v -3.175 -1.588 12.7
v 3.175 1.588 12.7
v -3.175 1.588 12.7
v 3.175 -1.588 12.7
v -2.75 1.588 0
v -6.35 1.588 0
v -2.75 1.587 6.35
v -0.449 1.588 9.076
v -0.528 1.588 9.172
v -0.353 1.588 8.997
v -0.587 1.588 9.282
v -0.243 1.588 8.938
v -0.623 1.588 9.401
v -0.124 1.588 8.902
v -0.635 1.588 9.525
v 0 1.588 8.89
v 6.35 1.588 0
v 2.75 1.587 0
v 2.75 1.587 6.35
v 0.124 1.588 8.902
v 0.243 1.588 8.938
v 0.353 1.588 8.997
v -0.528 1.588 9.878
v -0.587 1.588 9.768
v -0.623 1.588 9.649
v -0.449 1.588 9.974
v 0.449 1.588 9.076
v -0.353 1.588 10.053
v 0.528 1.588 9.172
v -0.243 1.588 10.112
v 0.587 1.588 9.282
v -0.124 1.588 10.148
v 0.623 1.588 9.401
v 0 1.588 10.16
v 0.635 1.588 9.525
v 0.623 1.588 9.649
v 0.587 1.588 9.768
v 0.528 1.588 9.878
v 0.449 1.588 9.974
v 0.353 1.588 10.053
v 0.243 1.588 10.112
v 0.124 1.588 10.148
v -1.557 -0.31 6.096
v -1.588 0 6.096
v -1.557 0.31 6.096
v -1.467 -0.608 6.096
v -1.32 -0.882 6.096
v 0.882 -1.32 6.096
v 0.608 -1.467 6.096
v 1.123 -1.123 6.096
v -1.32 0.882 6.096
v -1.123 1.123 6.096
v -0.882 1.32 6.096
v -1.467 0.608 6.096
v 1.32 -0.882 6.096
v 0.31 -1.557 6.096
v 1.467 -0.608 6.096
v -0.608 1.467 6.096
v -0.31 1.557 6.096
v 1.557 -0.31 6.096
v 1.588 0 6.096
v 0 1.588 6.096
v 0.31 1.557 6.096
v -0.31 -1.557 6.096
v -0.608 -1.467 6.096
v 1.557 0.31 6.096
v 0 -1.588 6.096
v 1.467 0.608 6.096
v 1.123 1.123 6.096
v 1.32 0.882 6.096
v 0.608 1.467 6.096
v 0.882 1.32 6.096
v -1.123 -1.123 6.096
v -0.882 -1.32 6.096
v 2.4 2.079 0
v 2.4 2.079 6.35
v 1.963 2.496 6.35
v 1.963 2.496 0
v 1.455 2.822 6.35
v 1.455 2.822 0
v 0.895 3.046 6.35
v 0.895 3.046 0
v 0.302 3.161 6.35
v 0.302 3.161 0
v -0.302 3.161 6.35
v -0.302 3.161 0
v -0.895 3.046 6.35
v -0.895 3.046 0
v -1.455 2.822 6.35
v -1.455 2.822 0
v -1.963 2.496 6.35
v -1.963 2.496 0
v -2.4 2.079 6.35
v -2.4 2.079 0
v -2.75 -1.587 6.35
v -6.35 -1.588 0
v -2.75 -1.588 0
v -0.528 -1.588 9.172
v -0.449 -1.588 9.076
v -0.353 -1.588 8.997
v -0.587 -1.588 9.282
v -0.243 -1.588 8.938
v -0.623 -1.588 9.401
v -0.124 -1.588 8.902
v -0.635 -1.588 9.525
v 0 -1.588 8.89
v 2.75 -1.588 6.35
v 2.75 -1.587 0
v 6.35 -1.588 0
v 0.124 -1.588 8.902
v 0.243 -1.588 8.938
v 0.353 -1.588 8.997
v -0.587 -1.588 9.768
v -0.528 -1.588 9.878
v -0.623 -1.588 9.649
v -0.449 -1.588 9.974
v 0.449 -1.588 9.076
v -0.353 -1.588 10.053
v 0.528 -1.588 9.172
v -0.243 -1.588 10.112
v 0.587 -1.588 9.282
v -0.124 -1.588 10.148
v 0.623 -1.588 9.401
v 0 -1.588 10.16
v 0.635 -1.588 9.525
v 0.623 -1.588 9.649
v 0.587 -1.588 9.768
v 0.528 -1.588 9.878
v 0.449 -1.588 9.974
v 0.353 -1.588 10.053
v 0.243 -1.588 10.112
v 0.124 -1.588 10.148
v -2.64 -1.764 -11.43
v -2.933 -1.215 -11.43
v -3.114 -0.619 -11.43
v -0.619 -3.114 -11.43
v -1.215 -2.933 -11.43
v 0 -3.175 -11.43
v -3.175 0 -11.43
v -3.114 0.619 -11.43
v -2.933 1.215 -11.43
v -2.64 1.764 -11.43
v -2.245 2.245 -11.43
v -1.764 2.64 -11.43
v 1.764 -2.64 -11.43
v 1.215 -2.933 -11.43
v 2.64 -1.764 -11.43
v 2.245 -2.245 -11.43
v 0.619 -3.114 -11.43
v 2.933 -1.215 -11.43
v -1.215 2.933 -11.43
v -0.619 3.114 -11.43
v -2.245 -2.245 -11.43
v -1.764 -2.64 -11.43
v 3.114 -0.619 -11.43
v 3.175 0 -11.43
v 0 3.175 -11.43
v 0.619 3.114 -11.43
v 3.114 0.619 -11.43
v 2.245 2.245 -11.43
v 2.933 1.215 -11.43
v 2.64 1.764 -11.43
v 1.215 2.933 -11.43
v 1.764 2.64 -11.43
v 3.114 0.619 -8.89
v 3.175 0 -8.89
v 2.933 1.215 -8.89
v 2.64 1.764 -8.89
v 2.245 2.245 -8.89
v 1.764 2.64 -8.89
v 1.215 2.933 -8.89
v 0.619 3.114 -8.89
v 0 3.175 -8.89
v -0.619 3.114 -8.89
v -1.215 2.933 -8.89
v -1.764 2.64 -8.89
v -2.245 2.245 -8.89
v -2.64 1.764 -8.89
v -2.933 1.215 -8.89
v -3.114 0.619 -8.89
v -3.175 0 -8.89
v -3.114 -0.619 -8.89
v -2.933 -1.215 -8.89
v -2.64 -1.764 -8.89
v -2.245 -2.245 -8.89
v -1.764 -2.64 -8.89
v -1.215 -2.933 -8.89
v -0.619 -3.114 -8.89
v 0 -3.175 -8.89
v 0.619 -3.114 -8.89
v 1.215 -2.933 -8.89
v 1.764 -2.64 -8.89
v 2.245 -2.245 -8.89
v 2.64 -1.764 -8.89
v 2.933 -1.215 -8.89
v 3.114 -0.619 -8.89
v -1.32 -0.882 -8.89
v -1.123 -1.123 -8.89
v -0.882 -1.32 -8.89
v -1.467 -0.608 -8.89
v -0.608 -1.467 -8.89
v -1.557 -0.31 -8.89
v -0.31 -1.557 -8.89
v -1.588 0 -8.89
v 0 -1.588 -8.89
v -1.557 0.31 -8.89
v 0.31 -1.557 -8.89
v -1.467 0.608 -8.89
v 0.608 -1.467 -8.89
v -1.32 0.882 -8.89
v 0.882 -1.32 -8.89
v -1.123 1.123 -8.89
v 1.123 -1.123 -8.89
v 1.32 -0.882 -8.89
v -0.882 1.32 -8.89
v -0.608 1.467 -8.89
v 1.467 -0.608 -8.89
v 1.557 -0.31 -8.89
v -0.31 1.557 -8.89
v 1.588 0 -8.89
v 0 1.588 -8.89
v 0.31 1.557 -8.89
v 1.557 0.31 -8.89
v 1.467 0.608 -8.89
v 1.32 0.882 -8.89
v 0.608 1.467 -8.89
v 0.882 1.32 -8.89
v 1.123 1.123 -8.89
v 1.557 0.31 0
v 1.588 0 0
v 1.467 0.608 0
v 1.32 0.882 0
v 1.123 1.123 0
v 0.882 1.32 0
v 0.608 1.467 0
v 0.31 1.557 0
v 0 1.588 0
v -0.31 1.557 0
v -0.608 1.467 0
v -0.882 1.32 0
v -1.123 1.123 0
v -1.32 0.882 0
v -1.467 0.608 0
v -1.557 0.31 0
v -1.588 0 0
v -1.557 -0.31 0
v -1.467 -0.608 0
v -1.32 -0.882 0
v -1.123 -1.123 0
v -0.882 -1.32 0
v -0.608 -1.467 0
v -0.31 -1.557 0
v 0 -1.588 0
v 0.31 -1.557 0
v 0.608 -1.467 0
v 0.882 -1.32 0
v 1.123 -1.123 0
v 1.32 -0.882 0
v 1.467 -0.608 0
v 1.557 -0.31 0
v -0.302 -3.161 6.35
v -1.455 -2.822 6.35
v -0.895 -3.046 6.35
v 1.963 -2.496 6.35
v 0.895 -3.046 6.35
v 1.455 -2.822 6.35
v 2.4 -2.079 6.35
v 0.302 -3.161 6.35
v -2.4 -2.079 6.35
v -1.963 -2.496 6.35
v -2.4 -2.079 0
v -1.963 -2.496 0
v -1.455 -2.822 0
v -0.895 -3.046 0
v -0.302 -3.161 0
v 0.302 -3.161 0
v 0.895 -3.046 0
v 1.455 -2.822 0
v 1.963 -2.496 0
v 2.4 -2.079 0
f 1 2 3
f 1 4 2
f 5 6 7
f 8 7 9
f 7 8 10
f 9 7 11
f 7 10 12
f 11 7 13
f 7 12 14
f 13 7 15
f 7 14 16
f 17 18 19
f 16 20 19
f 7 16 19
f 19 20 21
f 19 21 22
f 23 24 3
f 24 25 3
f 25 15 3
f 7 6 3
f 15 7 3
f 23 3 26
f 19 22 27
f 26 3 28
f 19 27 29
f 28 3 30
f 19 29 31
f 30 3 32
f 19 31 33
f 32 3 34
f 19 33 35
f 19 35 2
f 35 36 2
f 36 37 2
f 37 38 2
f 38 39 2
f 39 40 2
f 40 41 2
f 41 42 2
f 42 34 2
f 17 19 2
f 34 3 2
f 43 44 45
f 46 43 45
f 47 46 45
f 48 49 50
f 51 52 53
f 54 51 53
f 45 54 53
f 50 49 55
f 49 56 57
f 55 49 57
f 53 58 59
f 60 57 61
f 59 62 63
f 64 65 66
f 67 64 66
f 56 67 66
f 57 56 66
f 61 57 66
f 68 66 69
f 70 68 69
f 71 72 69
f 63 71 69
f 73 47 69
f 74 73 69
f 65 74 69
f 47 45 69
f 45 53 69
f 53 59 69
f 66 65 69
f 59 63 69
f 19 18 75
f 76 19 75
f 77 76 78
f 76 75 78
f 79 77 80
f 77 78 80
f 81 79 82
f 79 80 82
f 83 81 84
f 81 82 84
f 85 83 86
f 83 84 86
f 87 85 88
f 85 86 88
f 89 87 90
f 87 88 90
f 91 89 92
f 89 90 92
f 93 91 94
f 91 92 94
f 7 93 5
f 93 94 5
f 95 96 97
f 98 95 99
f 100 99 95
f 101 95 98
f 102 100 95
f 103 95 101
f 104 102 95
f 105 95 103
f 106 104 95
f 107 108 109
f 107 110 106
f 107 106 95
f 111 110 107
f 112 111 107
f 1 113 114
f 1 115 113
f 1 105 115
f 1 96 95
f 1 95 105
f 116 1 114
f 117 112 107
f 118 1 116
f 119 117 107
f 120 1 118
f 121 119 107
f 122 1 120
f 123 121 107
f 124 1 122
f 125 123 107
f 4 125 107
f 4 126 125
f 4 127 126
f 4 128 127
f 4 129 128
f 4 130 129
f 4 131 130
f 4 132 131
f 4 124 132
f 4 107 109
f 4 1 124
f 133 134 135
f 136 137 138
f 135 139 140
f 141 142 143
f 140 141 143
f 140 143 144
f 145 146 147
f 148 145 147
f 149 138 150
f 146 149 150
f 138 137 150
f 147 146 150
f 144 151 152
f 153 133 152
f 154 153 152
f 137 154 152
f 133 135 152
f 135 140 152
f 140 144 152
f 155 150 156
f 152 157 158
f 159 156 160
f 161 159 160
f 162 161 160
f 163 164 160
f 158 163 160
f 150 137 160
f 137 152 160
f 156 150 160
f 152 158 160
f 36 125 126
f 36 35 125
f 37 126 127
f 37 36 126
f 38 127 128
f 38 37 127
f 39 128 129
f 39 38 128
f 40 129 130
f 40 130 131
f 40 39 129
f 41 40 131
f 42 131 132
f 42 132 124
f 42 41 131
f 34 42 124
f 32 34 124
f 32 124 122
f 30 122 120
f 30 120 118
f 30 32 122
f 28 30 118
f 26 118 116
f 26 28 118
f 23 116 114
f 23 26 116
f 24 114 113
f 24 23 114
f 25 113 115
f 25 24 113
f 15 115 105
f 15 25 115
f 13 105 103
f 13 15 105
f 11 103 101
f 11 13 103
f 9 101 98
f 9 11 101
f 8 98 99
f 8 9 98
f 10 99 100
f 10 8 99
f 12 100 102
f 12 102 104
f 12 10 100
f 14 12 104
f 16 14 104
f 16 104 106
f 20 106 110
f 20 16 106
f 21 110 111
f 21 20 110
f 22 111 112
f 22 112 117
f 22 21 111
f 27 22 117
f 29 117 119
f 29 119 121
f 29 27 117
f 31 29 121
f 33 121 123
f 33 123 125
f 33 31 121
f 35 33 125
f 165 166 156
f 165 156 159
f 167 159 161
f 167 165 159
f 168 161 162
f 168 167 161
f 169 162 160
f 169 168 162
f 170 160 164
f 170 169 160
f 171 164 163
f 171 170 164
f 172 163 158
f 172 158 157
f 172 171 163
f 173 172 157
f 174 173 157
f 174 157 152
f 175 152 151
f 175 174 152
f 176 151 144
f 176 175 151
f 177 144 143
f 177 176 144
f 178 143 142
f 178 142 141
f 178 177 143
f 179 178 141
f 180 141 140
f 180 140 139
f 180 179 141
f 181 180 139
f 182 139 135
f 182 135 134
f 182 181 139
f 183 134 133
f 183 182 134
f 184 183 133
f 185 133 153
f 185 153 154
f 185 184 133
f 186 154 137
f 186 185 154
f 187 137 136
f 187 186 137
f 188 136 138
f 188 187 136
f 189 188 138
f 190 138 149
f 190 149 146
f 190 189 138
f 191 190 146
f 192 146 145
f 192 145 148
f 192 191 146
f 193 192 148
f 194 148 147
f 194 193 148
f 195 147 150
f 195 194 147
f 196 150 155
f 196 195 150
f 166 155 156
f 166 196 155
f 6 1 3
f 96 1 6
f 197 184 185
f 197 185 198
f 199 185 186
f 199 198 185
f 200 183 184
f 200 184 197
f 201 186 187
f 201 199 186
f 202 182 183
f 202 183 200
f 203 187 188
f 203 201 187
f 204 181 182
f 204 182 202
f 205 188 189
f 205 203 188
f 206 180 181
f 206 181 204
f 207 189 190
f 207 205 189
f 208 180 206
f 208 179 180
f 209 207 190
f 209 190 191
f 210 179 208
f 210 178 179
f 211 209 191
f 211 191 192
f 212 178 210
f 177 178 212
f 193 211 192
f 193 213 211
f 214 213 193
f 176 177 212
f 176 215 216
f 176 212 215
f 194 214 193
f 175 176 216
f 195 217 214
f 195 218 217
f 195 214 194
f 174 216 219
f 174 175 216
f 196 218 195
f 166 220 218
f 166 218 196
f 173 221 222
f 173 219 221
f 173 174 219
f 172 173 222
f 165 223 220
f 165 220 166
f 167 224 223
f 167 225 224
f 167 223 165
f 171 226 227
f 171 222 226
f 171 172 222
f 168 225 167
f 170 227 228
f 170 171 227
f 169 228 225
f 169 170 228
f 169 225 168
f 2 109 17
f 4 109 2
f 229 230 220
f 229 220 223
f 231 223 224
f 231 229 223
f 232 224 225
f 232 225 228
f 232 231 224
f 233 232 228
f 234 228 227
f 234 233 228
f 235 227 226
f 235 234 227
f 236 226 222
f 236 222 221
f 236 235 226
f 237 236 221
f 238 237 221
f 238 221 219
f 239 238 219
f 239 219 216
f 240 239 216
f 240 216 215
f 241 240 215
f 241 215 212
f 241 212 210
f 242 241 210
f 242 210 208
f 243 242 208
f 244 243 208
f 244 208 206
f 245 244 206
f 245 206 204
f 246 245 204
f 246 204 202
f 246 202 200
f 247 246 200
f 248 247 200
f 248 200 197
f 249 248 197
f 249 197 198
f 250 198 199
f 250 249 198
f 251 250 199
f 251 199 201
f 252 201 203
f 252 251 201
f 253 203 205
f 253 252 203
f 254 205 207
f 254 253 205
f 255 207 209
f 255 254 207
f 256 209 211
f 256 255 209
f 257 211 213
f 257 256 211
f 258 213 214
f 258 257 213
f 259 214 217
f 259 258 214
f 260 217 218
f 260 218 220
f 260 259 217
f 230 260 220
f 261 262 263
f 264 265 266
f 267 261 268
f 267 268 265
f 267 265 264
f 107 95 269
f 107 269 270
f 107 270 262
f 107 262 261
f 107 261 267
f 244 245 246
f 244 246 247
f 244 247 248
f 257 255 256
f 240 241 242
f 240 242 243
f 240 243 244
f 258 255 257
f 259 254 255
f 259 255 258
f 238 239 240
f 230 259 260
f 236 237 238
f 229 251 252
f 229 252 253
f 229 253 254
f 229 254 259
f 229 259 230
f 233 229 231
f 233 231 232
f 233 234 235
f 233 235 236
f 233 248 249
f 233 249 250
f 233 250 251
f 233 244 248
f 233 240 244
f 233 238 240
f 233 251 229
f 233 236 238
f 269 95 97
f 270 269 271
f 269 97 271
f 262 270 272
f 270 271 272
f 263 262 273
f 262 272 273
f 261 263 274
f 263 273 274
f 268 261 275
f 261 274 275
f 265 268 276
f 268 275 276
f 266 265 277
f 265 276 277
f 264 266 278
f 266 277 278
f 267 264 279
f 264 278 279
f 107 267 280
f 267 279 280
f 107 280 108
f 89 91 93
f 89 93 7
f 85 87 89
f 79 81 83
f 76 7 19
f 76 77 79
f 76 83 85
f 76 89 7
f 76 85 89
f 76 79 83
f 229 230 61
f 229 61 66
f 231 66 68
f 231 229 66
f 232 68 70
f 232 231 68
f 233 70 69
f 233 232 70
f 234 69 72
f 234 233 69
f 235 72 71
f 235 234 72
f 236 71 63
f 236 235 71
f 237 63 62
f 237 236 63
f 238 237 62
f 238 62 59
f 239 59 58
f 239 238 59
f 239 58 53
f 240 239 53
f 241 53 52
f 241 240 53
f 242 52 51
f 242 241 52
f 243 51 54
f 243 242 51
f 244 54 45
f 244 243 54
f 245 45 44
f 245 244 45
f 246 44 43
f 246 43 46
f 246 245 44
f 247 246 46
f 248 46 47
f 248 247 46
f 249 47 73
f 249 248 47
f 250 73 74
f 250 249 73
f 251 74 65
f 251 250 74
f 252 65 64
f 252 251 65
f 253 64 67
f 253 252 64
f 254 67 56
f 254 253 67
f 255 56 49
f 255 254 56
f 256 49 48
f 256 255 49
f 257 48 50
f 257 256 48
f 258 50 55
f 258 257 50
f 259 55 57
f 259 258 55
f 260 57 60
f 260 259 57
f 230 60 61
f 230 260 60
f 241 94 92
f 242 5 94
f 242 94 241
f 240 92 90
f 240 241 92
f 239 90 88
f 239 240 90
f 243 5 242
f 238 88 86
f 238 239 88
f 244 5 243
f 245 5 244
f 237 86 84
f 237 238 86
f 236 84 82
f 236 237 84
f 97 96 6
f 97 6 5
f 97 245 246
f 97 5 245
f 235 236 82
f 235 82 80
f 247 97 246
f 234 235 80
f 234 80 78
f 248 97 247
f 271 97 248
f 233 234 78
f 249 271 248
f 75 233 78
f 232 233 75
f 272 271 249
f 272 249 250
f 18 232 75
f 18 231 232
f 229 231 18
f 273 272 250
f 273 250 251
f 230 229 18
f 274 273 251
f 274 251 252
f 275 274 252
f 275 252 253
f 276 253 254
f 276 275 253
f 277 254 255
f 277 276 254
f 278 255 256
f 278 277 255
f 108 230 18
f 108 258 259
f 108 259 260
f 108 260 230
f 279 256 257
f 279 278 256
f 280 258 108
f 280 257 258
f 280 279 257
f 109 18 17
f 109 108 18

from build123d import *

# Parameters (mm, degrees)
F0_R          = 0.635
F1_DEPTH      = 1.5875
F1_DEPTH_BACK = 1.5875
F2_R          = 3.175
F2_R_2        = 1.5875
F3_DEPTH      = 6.35
F4_DEPTH      = 6.096
F5_DEPTH      = 11.43
F6_START      = -8.89
F6_DEPTH      = 2.54


with BuildPart() as f1:
    # F0 (on Front) → F1 (new body, two sides)
    with BuildSketch(Plane.XZ) as f1_sk:
        Polygon((-3.175, 12.7), (-6.35, 0), (6.35, 0), (3.175, 12.7), align=None)
        with Locations((0, 9.525)):
            Circle(F0_R, mode=Mode.SUBTRACT)
    extrude(amount=F1_DEPTH)
    extrude(f1_sk.sketch, amount=-F1_DEPTH_BACK)

    # F2 (on Top) → F3 (join)
    with BuildSketch(Plane.XY):
        Circle(F2_R)
        Circle(F2_R_2, mode=Mode.SUBTRACT)
    extrude(amount=F3_DEPTH)

    # F2 (on Top) → F4 (cut)
    with BuildSketch(Plane.XY):
        Circle(F2_R_2)
    extrude(amount=F4_DEPTH, mode=Mode.SUBTRACT)


with BuildPart() as f5:
    # F2 (on Top) → F5 (new body)
    with BuildSketch(Plane.XY):
        Circle(F2_R_2)
    extrude(amount=-F5_DEPTH)

    # F2 (on Top) → F6 (join)
    with BuildSketch(Plane.XY.offset(F6_START)):
        Circle(F2_R)
        Circle(F2_R_2, mode=Mode.SUBTRACT)
    extrude(amount=-F6_DEPTH)


solid = Compound([f1.part, f5.part])
